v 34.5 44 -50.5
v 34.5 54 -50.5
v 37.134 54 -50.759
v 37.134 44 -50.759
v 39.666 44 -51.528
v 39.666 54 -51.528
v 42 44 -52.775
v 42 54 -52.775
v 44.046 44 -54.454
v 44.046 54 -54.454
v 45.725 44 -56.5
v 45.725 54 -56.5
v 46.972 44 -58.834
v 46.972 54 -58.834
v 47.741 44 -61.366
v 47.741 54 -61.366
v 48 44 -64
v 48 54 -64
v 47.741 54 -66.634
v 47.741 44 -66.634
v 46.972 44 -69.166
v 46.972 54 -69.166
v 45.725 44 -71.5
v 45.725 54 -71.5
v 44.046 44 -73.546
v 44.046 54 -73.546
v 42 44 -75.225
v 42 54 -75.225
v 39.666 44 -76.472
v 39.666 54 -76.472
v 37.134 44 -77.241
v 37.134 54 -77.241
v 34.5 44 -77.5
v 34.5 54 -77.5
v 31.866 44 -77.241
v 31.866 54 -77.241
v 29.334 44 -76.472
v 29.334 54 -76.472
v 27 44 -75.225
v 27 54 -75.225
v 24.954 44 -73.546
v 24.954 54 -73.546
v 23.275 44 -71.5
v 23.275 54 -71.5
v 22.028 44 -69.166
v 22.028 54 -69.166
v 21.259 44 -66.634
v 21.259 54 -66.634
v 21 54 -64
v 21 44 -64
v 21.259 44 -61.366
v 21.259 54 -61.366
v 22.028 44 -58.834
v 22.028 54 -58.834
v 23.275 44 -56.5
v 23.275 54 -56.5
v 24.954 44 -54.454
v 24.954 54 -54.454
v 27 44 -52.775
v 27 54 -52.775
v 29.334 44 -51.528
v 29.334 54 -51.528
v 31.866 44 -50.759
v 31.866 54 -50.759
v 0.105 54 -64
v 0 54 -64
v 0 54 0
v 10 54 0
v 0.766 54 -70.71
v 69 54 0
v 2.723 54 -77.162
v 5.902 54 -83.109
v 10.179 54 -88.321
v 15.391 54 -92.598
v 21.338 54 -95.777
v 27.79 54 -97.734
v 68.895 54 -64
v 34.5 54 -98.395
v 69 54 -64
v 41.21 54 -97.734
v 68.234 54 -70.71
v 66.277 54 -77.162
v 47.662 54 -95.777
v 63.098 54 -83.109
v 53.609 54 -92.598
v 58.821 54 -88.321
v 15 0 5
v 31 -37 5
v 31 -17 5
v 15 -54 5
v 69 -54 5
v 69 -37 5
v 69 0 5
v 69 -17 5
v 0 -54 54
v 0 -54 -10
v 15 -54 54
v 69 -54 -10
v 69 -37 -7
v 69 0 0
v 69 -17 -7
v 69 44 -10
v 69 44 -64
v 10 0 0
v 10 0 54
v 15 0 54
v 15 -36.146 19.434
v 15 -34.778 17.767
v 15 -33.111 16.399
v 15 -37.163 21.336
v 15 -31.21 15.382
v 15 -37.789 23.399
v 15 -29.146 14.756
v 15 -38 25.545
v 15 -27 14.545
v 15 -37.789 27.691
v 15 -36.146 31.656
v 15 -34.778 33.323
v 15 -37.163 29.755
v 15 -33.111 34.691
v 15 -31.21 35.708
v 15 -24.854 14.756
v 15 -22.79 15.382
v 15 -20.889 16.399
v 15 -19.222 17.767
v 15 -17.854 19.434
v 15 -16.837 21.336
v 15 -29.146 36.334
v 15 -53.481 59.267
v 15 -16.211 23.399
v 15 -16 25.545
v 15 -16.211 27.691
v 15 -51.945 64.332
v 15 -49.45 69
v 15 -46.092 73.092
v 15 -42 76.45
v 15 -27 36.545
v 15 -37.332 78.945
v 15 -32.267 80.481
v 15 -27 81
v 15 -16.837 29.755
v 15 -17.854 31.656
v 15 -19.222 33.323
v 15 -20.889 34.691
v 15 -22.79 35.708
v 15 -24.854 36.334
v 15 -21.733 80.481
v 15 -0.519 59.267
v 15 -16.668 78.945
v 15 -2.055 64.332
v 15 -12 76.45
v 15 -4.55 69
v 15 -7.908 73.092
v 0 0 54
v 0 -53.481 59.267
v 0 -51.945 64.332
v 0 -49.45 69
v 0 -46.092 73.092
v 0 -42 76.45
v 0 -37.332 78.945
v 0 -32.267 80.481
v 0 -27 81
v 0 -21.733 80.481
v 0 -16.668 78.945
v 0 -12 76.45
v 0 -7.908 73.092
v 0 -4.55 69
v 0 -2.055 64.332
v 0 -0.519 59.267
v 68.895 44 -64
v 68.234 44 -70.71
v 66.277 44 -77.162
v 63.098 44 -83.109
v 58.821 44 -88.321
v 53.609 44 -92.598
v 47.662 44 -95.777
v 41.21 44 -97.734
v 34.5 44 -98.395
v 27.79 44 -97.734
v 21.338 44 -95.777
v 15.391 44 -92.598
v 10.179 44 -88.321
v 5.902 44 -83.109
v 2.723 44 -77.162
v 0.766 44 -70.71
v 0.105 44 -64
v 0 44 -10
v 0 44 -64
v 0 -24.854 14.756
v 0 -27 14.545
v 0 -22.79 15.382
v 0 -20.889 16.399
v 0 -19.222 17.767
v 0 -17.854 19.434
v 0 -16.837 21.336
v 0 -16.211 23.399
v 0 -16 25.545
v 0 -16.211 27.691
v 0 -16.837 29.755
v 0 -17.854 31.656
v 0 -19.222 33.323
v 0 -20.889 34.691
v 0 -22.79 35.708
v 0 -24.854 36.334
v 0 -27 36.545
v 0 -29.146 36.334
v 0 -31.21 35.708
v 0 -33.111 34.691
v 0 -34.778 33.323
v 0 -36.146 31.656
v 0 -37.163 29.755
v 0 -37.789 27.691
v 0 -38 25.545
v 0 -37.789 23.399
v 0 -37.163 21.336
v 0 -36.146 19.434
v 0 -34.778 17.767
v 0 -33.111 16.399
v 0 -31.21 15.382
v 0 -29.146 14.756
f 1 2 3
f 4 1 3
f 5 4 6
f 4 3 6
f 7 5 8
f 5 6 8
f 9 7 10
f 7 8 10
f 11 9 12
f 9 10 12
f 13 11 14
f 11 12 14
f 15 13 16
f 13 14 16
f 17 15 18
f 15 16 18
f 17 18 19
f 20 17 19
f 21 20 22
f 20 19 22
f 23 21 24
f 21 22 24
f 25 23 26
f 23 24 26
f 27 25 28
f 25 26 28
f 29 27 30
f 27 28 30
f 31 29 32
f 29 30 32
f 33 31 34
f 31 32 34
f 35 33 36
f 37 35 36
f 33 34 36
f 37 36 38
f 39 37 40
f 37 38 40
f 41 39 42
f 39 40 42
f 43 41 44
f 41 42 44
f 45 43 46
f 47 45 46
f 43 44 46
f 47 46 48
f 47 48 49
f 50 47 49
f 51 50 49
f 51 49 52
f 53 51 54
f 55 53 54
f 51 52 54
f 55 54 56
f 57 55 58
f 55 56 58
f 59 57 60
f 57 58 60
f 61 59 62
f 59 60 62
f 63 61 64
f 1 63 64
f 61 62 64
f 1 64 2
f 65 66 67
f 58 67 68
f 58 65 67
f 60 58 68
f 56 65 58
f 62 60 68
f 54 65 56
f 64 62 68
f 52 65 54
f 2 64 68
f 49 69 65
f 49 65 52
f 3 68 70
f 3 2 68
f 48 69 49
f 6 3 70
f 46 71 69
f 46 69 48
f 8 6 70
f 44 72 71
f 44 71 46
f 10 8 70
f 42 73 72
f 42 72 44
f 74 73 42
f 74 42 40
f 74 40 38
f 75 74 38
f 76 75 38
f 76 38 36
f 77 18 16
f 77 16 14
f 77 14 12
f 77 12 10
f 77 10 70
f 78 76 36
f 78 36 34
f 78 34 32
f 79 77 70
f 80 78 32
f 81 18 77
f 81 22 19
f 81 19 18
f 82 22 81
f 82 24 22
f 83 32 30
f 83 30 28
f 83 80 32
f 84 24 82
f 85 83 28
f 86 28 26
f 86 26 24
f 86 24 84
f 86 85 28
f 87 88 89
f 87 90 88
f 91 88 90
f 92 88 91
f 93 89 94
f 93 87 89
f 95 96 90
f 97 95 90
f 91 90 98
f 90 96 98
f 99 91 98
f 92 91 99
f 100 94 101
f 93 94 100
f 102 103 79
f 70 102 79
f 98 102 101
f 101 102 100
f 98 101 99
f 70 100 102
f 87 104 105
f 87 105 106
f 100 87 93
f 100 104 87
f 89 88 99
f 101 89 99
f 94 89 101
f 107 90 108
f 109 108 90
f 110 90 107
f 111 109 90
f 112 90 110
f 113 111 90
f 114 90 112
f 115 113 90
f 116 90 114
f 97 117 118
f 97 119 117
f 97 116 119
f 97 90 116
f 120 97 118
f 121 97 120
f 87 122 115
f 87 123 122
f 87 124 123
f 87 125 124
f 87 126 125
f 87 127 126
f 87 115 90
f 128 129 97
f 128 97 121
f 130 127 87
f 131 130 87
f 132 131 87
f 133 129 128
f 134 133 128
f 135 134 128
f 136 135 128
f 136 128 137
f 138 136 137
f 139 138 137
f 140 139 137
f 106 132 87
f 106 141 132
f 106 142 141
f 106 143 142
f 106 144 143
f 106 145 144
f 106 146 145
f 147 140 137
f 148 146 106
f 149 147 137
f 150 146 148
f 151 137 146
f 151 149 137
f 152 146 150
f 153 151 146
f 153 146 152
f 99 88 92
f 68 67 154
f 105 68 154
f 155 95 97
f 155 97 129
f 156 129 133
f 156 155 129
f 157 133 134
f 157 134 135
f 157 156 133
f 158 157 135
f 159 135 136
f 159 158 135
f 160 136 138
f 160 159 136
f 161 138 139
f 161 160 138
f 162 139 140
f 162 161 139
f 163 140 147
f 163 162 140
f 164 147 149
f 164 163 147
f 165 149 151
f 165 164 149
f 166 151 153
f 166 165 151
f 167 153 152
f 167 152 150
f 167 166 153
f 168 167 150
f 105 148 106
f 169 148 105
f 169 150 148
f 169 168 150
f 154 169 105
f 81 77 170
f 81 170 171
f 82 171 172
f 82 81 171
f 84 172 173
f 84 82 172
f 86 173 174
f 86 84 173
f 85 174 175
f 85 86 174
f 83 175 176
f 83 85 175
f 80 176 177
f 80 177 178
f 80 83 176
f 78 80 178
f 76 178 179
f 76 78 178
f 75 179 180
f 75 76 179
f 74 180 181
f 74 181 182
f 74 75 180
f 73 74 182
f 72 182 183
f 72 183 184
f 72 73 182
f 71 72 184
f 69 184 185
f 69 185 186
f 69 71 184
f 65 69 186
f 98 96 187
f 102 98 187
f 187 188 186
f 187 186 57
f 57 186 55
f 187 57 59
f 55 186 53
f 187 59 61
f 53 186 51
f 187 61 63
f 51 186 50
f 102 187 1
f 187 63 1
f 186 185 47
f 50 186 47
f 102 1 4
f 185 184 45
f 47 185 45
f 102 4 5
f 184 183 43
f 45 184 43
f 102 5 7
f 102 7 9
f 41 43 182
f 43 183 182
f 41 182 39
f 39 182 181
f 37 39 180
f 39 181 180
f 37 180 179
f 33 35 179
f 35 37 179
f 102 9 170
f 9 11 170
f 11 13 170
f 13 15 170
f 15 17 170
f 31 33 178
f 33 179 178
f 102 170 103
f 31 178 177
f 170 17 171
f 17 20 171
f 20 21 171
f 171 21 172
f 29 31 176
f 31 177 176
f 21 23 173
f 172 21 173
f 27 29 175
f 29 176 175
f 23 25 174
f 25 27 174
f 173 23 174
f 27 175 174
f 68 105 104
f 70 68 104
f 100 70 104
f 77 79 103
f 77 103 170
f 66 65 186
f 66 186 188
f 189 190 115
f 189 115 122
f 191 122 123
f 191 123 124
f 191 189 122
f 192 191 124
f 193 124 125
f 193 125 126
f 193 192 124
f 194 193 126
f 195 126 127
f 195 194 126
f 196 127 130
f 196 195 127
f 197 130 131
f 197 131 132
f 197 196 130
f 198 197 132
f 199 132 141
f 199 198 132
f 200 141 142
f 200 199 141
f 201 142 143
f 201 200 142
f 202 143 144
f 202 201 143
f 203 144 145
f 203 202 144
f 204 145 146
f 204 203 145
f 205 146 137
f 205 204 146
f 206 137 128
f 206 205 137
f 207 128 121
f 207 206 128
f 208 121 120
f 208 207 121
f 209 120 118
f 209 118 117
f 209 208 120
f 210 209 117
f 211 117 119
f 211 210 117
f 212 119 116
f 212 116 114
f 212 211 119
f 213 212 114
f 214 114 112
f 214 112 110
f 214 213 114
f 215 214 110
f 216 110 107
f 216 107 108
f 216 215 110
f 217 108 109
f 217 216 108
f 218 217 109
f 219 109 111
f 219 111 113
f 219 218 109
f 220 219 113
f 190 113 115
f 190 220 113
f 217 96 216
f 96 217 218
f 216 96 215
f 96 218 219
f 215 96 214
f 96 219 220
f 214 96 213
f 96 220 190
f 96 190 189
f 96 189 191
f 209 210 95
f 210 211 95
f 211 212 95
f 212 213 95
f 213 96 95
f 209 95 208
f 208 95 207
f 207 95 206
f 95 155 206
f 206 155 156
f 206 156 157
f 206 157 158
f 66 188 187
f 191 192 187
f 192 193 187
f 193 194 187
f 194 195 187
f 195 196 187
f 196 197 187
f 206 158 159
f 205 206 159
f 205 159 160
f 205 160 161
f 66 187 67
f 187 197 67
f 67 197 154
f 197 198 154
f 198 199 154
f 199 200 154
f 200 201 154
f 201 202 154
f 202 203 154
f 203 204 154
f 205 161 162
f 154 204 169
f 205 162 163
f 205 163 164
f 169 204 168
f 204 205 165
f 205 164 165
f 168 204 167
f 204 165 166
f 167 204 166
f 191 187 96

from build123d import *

# Parameters (mm, degrees)
BOSS_EXTRUDE1_DEPTH = 10
SKETCH2_3_R         = 11
BOSS_EXTRUDE2_DEPTH = 15
SKETCH3_W           = 15
SKETCH3_H           = 108
BOSS_EXTRUDE3_DEPTH = 10
BOSS_EXTRUDE4_DEPTH = 54
SKETCH5_W           = 54
SKETCH5_H           = 54
BOSS_EXTRUDE5_DEPTH = 5
SKETCH8_W           = 69
SKETCH8_H           = 10
BOSS_EXTRUDE6_DEPTH = 54
SKETCH10_R          = 34.395117581
SKETCH10_R_2        = 13.5
BOSS_EXTRUDE7_DEPTH = 10
SKETCH11_R          = 13.5
CUT_EXTRUDE1_DEPTH  = 10
SKETCH12_W          = 38
SKETCH12_H          = 20
CUT_EXTRUDE2_DEPTH  = 12
BOSS_EXTRUDE9_DEPTH = 20


with BuildPart() as part:
    # Sketch2 → Boss-Extrude1 (new body)
    with BuildSketch(Plane(origin=(0, 0, 0), x_dir=(0, 0, -1), z_dir=(1, 0, 0))):
        Polygon((-54, 0), (0, 0), (0, 54), align=None)
    extrude(amount=BOSS_EXTRUDE1_DEPTH)

    # Sketch2<3> → Boss-Extrude2 (add)
    with BuildSketch(Plane(origin=(0, 0, 0), x_dir=(0, 0, -1), z_dir=(1, 0, 0))):
        with BuildLine():
            Line((0, -54), (0, 0))
            Line((0, 0), (-54, 0))
            ThreePointArc((-54, 0), (-81, -27), (-54, -54))
            Line((-54, -54), (0, -54))
        make_face()
        with Locations((-25.545100882, -27)):
            Circle(SKETCH2_3_R, mode=Mode.SUBTRACT)
    extrude(amount=BOSS_EXTRUDE2_DEPTH)

    # Sketch3 → Boss-Extrude3 (add)
    with BuildSketch(Plane(origin=(0, 0, 0), x_dir=(-1, 0, 0), z_dir=(0, 0, -1))):
        with Locations((-7.5, 0)):
            Rectangle(SKETCH3_W, SKETCH3_H)
    extrude(amount=BOSS_EXTRUDE3_DEPTH)

    # Sketch4 → Boss-Extrude4 (add)
    with BuildSketch(Plane(origin=(15, 0, 0), x_dir=(0, 0, -1), z_dir=(1, 0, 0))):
        Polygon((10, 54), (0, 54), (0, 0), (0, -54), (10, -54), align=None)
    extrude(amount=BOSS_EXTRUDE4_DEPTH)

    # Sketch5 → Boss-Extrude5 (add)
    with BuildSketch(Plane.XY):
        with Locations((42, -27)):
            Rectangle(SKETCH5_W, SKETCH5_H)
    extrude(amount=BOSS_EXTRUDE5_DEPTH)

    # Sketch8 → Boss-Extrude6 (add)
    with BuildSketch(Plane(origin=(0, 0, -10), x_dir=(-1, 0, 0), z_dir=(0, 0, -1))):
        with Locations((-34.5, 49)):
            Rectangle(SKETCH8_W, SKETCH8_H)
    extrude(amount=BOSS_EXTRUDE6_DEPTH)

    # Sketch10 → Boss-Extrude7 (add)
    with BuildSketch(Plane(origin=(0, 54, 0), x_dir=(1, 0, 0), z_dir=(0, 1, 0))):
        with Locations((34.5, 64)):
            Circle(SKETCH10_R)
        with Locations((34.5, 64)):
            Circle(SKETCH10_R_2, mode=Mode.SUBTRACT)
    extrude(amount=-BOSS_EXTRUDE7_DEPTH)

    # Sketch11 → Cut-Extrude1 (cut)
    with BuildSketch(Plane(origin=(0, 54, 0), x_dir=(1, 0, 0), z_dir=(0, 1, 0))):
        with Locations((34.5, 64)):
            Circle(SKETCH11_R)
    extrude(amount=-CUT_EXTRUDE1_DEPTH, mode=Mode.SUBTRACT)

    # Sketch12 → Cut-Extrude2 (cut)
    with BuildSketch(Plane.XY.offset(5)):
        with Locations((50, -27)):
            Rectangle(SKETCH12_W, SKETCH12_H)
    extrude(amount=-CUT_EXTRUDE2_DEPTH, mode=Mode.SUBTRACT)

    # Sketch14 → Boss-Extrude9 (add)
    with BuildSketch(Plane(origin=(0, -37, 0), x_dir=(1, 0, 0), z_dir=(0, 1, 0))):
        Polygon((31, -5), (69, 7), (31, 7), align=None)
    extrude(amount=BOSS_EXTRUDE9_DEPTH)


solid = part.part
